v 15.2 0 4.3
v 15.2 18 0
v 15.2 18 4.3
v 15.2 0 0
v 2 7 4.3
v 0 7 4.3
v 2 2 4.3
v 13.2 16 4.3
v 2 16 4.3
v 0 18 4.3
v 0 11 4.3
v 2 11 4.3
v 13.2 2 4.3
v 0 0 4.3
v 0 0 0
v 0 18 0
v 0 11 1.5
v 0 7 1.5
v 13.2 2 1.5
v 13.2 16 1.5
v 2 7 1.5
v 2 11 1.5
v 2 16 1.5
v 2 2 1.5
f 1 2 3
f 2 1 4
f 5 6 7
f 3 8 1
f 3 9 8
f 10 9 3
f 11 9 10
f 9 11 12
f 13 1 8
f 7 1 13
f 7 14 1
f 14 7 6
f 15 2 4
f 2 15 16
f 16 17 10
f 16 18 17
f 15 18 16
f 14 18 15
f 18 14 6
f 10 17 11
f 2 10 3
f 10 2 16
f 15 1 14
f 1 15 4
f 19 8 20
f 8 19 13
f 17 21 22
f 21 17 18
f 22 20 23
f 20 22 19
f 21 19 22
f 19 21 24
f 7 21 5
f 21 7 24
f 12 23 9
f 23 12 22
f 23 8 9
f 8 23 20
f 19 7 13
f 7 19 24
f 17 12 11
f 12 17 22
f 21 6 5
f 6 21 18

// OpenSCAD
// One source-identified GY-530 PCB FIT COUPON, not a desk-safety mounting bracket.
// ElectroPeak SEN-19-006 states body outline 10.5 x 13.3 mm. No verified PCB
// thickness, lens center, through-hole locations or signal pad orientation.
// Original CC0 source. Print a coupon and measure the ACTUAL part.
$fn = 48;
part = "vl53l0x_gy530_fit_gauge";
board_x = 10.5;
board_y = 13.3;
fit_each_side = 0.35;
wall = 2.0;
base = 1.5;
pocket_depth = 2.8; // nonbinding sample ONLY; actual carrier PCB unknown
module vl53l0x_gy530_fit_gauge() {
    x = board_x + 2*fit_each_side;
    y = board_y + 2*fit_each_side;
    assert(board_x>0 && board_y>0 && x<14 && y<18,
           "GY530 board footprint outside meaningful sample bounds");
    assert(y>=8, "GY530 removal notch breaches pocket corner web");
    assert(fit_each_side >= 0.2 && fit_each_side <= 0.8);
    // A source fit cup with a zero-thickness floor or paper-thin perimeter
    // cannot safely measure this nominal board's actual XY footprint.
    assert(wall >= 2 && wall <= 6,
           "GY530 coupon side wall below printable minimum");
    assert(base >= 1.5 && base <= 6,
           "GY530 coupon floor below printable minimum");
    assert(pocket_depth >= 2 && pocket_depth <= 10,
           "GY530 coupon depth outside meaningful sample bounds");
    difference() {
        cube([x+2*wall, y+2*wall, base+pocket_depth]);
        // Open upper pocket measures printed XY fit, NOT lens or bolts.
        translate([wall,wall,base]) cube([x,y,pocket_depth+1]);
        // Visible notch allows gentle removal WITHOUT touching optical lens.
        translate([0,(y+2*wall)/2-2.0,base])
            cube([wall+0.1,4.0,pocket_depth+1]);
    }
}

/*
 * Free standing, UNPOWERED downward optical height trial for the selected
 * nominal GY-530 carrier. Only the board's 10.5 x 13.3 mm outer drawing
 * is known. Its actual lens extension, orientation, internal lens center,
 * PCB thickness, wiring and floor standoff are NOT measured.
 *
 * This tapered hollow support leaves an optical opening to the desk. A
 * real board can rest on its top ring during stationary, operator attended
 * checks. There is intentionally NO PCB clamp or chassis mounting feature;
 * it must never be used for driving or to certify cliff clearance.
 *
 * Heights 35/45/55 mm describe the board support rim, NOT lens standoff.
 */
module vl53l0x_gy530_height_trial(height_mm) {
    bottom_x = 37;
    bottom_y = 39;
    inner_bottom_x = 31;
    inner_bottom_y = 33;
    top_x = board_x + 6;
    top_y = board_y + 6;
    inner_top_x = board_x - 3;
    inner_top_y = board_y - 3;
    // ST DS11555 rev 6 section 6.1: system FoV is a full 25 degrees.
    // Use the adapter's provisional 6 mm optical envelope, centered at the
    // board rim. This is a geometric screen, NOT a measured optical origin.
    optical_r = 3;
    half_angle = 25/2;
    assert(min(inner_bottom_x,inner_bottom_y)/2 >=
           optical_r + height_mm*tan(half_angle),
           "Height trial base clips nominal optical keepout");
    assert(min(inner_top_x,inner_top_y)/2 >= optical_r + 3*tan(half_angle),
           "Height trial rim clips nominal optical keepout");
    assert(height_mm >= 35 && height_mm <= 55,
           "Height trial outside measured candidate range");
    assert(bottom_x - inner_bottom_x >= 6 && bottom_y - inner_bottom_y >= 6,
           "Height trial base wall below printable minimum");
    assert(top_x - inner_top_x >= 8 && top_y - inner_top_y >= 8,
           "Height trial top ring below printable minimum");
    assert(inner_top_x > 6 && inner_top_y > 9,
           "Height trial optical opening too narrow");
    difference() {
        hull() {
            translate([-bottom_x/2,-bottom_y/2,0])
                cube([bottom_x,bottom_y,3]);
            translate([-top_x/2,-top_y/2,height_mm-3])
                cube([top_x,top_y,3]);
        }
        hull() {
            translate([-inner_bottom_x/2,-inner_bottom_y/2,-1])
                cube([inner_bottom_x,inner_bottom_y,4]);
            translate([-inner_top_x/2,-inner_top_y/2,height_mm-3])
                cube([inner_top_x,inner_top_y,4]);
        }
    }
}
if(part == "vl53l0x_gy530_fit_gauge") vl53l0x_gy530_fit_gauge();
else if(part == "vl53l0x_gy530_height_trial_035") vl53l0x_gy530_height_trial(35);
else if(part == "vl53l0x_gy530_height_trial_045") vl53l0x_gy530_height_trial(45);
else if(part == "vl53l0x_gy530_height_trial_055") vl53l0x_gy530_height_trial(55);
else assert(false,"Unknown coupon");
